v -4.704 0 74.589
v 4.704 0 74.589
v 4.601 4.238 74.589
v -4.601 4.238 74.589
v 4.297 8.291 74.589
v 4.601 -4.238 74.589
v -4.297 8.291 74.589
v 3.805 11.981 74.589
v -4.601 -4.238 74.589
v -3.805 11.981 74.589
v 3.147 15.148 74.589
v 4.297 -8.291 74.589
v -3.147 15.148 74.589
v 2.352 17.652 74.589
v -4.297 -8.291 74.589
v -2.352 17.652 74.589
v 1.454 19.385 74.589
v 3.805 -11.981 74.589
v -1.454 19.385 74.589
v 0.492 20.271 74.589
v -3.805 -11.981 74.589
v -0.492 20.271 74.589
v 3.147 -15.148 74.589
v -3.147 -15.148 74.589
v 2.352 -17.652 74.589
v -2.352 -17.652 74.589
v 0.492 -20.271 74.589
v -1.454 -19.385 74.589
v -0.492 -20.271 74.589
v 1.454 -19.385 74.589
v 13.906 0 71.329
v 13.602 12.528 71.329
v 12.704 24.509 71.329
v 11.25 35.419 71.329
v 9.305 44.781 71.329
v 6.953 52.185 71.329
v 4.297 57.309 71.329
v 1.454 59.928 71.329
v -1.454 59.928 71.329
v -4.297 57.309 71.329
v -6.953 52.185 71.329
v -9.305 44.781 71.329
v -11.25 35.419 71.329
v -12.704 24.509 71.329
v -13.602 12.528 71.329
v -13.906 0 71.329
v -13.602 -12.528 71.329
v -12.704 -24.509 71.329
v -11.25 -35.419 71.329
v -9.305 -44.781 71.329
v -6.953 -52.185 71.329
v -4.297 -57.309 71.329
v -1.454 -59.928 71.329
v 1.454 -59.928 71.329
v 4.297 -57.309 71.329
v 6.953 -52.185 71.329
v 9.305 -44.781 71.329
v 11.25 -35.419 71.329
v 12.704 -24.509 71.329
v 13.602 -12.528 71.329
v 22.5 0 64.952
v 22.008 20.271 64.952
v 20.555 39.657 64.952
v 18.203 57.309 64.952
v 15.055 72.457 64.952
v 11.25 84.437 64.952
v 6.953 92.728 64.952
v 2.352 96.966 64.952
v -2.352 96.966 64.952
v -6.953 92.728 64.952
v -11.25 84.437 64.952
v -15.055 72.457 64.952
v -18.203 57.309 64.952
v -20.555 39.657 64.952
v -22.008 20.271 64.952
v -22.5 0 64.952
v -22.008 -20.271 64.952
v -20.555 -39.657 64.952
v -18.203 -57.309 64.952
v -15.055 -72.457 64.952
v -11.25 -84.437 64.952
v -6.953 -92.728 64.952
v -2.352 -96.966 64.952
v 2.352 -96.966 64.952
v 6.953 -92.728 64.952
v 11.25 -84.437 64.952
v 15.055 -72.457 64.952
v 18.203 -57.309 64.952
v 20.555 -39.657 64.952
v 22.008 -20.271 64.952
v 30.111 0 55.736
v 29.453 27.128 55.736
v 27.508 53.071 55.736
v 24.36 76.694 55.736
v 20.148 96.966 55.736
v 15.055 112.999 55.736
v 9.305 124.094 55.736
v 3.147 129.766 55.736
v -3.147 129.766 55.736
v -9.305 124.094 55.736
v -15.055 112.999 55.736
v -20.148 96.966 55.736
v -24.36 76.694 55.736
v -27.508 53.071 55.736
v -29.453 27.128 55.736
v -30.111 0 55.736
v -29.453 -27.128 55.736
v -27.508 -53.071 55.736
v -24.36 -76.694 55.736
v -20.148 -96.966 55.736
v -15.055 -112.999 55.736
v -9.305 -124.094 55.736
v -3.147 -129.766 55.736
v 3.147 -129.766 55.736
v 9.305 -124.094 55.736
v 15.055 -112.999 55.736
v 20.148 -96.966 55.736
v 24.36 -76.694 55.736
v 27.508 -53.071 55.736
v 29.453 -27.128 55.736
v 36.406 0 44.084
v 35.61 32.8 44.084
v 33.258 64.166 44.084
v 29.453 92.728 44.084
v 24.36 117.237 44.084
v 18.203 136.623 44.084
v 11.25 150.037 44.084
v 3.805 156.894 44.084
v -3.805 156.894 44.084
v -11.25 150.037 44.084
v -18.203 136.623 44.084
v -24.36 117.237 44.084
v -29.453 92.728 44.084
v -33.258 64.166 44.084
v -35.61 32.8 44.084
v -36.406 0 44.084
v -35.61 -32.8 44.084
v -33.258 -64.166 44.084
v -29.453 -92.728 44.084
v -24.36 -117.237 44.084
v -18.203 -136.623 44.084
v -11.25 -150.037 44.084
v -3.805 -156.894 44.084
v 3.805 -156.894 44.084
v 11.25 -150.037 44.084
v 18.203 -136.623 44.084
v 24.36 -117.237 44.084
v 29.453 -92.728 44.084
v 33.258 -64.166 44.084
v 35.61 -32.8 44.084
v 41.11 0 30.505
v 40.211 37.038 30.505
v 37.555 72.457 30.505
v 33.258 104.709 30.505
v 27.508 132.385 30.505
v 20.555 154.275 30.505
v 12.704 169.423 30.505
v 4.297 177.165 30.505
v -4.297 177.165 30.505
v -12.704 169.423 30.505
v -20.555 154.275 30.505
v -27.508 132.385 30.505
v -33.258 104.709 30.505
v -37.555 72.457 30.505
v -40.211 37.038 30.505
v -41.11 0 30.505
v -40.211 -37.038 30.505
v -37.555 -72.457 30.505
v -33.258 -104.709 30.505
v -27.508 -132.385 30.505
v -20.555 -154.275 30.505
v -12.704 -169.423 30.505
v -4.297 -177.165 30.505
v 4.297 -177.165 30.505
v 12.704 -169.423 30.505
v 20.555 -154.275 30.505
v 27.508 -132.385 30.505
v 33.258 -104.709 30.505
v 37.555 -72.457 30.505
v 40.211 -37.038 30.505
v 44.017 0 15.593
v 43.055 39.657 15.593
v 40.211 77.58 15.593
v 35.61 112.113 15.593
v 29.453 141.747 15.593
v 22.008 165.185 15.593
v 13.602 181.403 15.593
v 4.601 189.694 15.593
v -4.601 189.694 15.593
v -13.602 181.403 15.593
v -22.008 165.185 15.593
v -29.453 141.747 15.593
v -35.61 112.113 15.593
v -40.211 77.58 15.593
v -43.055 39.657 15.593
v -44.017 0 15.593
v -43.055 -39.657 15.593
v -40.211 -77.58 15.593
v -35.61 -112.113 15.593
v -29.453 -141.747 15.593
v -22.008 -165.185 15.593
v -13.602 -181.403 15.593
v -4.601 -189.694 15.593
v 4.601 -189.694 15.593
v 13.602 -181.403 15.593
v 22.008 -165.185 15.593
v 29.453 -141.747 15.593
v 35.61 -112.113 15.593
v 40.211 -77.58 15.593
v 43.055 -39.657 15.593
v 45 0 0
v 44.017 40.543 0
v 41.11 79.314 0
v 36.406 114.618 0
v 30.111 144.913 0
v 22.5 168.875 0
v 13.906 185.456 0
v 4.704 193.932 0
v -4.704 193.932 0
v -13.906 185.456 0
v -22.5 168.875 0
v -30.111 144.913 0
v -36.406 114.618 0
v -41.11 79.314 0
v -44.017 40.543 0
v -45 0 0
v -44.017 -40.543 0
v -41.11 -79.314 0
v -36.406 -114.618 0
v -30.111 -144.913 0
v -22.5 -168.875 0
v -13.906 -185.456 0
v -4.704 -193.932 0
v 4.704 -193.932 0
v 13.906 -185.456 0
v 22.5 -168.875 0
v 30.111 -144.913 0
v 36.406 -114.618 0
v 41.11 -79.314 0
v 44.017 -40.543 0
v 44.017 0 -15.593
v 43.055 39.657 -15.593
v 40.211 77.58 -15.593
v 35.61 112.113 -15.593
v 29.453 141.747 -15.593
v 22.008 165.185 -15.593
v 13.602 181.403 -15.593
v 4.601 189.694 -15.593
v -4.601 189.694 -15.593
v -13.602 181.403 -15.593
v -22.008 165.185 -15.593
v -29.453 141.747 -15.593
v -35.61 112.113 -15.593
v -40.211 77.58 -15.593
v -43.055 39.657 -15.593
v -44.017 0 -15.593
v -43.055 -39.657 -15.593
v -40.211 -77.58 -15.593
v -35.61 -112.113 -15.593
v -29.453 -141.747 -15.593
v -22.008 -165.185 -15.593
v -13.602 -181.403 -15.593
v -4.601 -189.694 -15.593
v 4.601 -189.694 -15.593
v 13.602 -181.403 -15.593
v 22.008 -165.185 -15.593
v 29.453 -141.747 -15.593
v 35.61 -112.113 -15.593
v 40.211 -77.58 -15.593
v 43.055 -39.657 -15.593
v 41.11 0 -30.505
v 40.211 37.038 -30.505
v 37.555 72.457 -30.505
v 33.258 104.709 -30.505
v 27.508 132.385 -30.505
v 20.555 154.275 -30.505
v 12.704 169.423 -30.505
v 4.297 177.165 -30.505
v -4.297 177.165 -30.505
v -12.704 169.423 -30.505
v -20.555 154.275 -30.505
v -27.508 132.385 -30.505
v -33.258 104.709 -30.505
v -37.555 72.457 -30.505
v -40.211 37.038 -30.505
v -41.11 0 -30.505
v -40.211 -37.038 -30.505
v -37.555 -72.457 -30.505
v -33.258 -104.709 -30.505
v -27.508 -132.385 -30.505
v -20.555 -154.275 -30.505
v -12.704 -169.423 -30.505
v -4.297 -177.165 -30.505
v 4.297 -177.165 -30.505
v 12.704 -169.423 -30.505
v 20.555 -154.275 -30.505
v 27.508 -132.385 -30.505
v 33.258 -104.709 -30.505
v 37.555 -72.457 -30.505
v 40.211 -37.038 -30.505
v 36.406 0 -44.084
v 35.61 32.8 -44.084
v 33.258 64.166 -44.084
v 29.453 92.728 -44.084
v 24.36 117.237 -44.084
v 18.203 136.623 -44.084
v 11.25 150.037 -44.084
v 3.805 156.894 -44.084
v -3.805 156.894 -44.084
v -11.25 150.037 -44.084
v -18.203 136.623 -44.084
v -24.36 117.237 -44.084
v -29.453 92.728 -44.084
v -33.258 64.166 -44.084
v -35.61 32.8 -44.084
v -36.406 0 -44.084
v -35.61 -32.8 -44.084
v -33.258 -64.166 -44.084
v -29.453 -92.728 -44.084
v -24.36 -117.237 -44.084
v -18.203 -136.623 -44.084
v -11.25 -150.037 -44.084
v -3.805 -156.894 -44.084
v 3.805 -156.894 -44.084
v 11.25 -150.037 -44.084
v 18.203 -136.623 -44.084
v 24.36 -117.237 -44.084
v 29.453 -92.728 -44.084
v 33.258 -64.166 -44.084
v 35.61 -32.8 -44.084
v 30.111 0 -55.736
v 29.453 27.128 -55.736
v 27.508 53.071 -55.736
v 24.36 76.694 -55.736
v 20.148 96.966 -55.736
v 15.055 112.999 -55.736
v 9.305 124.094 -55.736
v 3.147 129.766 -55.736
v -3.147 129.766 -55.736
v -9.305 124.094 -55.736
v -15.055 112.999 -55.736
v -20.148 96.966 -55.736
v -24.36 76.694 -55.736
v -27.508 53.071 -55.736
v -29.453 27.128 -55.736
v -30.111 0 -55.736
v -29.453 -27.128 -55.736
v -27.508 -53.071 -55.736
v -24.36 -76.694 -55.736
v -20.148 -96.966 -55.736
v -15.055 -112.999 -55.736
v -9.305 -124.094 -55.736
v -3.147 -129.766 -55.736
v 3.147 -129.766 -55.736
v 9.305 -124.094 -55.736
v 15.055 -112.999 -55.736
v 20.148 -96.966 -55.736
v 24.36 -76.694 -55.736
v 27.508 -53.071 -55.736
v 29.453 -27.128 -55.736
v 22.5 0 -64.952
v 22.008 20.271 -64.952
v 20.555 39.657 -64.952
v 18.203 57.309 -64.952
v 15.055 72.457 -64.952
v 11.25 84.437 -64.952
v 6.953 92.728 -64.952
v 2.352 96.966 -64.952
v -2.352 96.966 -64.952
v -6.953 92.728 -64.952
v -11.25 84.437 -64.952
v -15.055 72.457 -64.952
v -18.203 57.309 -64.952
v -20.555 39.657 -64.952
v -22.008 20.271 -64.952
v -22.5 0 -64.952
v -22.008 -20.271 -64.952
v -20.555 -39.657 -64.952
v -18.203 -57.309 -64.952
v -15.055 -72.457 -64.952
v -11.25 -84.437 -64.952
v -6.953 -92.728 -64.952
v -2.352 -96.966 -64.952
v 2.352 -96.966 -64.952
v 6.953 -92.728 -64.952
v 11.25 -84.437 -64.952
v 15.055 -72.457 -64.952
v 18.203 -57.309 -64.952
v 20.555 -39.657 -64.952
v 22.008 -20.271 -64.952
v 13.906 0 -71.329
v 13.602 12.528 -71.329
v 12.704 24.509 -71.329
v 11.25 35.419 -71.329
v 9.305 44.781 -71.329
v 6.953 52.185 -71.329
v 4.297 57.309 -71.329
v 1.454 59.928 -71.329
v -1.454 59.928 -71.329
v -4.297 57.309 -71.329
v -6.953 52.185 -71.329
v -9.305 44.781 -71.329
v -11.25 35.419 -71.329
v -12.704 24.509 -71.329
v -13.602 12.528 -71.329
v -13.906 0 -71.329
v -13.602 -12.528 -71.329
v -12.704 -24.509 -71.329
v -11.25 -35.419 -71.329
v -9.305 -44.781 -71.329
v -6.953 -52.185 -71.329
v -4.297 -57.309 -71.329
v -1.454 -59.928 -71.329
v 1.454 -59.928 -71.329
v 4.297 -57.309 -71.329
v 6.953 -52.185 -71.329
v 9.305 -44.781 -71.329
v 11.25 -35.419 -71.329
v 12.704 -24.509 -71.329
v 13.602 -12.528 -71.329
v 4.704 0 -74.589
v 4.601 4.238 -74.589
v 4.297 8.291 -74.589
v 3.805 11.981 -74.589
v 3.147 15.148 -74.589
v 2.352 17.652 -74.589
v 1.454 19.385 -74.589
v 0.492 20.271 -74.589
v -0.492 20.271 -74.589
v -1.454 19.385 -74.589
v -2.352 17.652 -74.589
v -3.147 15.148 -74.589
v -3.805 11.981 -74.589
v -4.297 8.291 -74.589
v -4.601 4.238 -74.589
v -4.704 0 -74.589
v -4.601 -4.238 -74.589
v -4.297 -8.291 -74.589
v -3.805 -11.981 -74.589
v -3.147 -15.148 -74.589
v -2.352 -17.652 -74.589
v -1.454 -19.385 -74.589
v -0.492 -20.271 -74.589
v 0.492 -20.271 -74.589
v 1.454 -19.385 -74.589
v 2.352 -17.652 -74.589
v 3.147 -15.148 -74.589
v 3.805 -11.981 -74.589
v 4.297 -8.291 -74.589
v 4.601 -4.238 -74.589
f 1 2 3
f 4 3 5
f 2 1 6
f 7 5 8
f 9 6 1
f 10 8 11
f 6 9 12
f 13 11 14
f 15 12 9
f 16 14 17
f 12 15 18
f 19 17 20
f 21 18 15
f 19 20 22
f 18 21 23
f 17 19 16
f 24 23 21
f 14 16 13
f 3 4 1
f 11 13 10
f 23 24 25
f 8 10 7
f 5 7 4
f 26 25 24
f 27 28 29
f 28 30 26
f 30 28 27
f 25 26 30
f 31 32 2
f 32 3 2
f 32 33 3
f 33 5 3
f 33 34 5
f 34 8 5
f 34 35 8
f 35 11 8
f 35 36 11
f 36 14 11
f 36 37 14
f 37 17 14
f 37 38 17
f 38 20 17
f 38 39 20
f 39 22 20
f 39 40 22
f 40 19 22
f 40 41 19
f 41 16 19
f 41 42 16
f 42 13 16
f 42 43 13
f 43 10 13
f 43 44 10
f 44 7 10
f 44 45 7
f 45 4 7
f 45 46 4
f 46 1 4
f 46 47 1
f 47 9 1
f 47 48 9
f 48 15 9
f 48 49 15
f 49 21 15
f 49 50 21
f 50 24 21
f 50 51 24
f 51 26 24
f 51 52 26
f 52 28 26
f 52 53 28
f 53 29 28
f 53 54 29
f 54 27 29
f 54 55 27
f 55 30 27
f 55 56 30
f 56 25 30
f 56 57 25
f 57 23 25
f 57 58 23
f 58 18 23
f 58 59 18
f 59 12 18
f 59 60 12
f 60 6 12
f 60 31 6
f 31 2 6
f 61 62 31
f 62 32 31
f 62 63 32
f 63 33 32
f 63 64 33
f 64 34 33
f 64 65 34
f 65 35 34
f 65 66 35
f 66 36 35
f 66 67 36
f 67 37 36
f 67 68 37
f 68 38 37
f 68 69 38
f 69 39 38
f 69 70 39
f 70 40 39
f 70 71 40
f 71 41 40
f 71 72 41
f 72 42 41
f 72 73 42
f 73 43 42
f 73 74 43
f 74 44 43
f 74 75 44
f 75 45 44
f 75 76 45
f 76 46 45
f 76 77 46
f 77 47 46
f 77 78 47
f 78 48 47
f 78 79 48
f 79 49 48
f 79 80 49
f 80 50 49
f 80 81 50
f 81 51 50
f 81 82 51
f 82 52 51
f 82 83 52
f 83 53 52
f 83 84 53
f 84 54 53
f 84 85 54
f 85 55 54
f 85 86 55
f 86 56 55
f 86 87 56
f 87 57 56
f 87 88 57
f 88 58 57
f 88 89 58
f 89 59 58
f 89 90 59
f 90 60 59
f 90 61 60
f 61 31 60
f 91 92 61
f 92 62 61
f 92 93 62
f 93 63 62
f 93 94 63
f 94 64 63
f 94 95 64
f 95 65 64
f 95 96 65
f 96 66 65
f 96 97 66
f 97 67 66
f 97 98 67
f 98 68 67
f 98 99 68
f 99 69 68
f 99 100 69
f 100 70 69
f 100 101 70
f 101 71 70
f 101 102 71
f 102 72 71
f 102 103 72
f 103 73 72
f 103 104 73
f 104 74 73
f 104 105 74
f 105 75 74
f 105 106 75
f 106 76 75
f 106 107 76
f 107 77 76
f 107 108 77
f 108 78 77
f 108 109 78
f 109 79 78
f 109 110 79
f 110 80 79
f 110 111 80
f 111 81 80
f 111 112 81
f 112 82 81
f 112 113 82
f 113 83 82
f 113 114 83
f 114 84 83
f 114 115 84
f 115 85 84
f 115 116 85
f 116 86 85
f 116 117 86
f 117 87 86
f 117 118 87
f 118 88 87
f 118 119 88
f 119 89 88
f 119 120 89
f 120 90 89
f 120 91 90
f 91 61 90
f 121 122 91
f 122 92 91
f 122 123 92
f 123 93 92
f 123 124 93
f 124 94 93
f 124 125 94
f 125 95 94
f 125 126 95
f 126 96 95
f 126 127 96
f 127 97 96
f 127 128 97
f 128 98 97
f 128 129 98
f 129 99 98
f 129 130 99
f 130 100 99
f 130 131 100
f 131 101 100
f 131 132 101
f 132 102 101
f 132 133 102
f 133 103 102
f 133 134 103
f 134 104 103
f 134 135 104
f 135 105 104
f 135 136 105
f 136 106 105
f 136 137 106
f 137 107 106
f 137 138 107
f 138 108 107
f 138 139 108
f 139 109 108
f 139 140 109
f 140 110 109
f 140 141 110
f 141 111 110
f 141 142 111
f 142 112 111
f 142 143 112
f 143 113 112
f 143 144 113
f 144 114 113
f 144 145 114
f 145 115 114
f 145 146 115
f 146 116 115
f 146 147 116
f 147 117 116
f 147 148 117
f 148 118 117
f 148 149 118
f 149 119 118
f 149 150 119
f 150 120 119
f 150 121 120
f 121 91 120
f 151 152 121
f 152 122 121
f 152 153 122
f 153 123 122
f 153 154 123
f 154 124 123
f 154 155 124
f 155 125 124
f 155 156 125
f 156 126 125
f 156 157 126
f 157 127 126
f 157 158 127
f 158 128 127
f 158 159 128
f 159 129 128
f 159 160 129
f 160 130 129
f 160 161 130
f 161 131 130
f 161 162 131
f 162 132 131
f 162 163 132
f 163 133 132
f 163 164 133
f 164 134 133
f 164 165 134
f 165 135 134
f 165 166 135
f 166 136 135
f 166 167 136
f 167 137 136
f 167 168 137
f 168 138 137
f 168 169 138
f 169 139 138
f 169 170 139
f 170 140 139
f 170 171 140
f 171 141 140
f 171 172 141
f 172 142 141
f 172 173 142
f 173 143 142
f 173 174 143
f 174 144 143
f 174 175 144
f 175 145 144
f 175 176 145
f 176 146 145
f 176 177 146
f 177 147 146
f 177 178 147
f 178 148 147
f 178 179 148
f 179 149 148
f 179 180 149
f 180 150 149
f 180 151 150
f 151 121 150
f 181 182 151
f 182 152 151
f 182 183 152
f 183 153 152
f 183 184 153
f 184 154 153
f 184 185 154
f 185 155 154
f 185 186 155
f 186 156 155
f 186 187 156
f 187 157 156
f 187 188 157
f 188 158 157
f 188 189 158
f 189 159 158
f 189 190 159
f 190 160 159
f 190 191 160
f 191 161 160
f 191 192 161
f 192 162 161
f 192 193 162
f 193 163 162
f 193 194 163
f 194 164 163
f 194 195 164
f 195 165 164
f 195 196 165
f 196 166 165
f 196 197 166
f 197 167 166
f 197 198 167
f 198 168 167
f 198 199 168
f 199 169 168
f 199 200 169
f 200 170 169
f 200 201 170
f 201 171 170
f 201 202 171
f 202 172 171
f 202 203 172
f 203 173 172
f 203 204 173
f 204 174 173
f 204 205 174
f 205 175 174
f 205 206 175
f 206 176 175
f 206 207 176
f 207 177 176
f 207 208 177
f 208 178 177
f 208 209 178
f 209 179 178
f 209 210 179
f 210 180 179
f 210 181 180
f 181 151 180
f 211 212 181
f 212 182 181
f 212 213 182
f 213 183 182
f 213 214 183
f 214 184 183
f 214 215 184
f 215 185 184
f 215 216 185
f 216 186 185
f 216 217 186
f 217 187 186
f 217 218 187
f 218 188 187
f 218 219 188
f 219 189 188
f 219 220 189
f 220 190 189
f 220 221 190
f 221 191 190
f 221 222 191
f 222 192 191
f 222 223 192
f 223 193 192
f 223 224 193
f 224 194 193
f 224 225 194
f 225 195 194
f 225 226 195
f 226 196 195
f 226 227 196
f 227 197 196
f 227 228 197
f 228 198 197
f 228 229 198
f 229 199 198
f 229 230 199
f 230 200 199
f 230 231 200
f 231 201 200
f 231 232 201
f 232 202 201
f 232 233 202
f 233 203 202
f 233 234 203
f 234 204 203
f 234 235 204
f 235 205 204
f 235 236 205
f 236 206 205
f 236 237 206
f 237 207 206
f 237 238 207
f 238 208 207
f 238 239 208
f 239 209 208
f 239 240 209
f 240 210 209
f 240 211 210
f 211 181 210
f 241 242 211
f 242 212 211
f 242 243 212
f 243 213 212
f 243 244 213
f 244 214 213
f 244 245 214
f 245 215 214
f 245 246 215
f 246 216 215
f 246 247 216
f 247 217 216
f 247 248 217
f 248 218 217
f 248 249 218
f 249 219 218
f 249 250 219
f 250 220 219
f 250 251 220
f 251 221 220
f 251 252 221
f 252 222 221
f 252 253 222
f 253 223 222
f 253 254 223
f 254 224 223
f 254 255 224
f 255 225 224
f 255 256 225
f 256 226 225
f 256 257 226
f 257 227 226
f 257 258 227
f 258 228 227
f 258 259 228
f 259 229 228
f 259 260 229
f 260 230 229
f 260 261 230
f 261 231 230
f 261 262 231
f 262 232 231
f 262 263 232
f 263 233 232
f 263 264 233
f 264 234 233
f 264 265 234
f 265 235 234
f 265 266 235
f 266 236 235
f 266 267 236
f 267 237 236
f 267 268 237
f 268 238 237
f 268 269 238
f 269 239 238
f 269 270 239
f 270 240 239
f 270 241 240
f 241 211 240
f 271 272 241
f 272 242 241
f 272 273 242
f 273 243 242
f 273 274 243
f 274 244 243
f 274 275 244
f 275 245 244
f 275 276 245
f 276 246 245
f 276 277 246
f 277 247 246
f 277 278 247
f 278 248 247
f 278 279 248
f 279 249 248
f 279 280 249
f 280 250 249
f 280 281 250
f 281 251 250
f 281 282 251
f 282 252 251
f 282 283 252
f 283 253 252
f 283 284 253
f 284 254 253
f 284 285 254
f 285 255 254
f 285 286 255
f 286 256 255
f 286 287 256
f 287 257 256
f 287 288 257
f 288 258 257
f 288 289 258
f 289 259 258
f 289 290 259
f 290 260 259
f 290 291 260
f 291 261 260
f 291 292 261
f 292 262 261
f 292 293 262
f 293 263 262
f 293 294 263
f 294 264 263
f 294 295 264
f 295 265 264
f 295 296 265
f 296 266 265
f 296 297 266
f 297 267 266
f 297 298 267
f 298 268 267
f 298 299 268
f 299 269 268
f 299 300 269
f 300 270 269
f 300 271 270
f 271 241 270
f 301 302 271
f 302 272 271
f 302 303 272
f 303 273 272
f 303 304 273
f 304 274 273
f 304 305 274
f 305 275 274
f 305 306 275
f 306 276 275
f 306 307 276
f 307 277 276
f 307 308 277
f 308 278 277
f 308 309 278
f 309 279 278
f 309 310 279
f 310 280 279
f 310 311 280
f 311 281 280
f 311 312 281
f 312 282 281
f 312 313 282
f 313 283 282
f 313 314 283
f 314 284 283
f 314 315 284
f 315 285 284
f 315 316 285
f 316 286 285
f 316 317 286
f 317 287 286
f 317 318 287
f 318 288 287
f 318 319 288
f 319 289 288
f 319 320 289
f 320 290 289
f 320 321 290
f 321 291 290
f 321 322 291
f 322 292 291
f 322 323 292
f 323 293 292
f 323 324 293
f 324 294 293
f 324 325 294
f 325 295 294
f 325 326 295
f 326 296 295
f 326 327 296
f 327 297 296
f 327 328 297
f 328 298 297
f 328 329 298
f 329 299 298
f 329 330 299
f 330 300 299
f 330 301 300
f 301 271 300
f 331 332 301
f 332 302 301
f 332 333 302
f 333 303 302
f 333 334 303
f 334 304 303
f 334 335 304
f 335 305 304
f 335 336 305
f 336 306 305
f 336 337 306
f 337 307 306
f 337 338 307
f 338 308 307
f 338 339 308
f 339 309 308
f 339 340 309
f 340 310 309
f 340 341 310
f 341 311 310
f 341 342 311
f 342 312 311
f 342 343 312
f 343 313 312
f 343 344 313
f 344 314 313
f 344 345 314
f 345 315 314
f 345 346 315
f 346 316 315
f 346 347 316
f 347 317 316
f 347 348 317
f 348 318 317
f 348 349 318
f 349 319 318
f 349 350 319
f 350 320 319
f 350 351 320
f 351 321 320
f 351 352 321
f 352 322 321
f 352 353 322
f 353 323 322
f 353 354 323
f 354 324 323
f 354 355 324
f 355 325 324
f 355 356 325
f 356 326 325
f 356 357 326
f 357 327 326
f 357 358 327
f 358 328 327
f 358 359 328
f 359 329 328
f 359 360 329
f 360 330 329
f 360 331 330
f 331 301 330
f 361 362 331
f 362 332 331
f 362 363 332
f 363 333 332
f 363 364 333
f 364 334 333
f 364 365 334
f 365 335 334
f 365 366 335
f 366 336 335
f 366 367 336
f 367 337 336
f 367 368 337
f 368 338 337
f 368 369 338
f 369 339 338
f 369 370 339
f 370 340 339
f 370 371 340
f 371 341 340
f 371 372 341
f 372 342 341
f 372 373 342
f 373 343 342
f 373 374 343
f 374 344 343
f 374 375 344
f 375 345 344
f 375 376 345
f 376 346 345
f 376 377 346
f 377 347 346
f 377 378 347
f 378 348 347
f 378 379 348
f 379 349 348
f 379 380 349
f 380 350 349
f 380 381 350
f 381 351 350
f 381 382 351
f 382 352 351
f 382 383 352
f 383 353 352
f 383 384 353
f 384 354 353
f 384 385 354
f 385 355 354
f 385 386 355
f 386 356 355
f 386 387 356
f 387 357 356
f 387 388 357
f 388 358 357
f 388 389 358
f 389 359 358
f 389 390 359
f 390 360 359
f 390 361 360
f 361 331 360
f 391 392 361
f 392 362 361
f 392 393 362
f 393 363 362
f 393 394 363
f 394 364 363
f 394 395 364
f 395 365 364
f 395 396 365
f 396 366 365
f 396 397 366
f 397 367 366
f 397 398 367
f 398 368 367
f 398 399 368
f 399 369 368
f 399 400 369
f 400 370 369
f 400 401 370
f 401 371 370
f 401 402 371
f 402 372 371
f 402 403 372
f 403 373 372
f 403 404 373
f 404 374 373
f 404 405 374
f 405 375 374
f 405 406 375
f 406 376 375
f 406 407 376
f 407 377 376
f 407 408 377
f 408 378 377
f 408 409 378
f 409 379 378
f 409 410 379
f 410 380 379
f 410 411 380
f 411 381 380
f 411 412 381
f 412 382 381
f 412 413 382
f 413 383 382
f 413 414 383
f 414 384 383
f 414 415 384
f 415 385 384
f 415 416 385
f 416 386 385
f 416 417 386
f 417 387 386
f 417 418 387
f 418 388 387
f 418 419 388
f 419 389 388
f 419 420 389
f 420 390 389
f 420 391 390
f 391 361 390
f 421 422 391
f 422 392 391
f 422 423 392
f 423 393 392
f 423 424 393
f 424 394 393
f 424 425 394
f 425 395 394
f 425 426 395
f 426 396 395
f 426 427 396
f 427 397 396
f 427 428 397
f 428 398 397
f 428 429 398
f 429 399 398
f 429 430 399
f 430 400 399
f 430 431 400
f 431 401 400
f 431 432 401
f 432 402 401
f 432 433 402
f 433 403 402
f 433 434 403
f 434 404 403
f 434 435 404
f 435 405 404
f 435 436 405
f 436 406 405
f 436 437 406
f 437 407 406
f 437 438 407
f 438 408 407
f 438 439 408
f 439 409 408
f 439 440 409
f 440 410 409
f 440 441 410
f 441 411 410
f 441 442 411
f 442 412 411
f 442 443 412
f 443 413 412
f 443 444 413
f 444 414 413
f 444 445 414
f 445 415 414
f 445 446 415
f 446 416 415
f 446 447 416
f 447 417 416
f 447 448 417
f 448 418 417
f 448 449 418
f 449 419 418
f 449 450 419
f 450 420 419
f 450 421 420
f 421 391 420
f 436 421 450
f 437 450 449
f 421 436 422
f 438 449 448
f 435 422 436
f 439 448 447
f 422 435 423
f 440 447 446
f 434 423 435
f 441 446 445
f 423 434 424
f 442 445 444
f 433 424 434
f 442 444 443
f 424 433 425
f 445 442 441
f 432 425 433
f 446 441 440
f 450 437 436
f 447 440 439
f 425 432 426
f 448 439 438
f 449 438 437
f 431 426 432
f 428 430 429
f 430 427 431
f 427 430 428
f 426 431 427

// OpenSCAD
// Generated by SolidPython 1.0.1 on 2020-07-29 00:46:45


scale(v = [3, 13, 5]) {
	sphere(r = 15);
}
/***********************************************
*********      SolidPython code:      **********
************************************************
 
# import packages: SolidPython
from solid import *
from solid.utils import *
from itertools import chain, combinations, permutations


class Resize:

    def __init__(self, scad_file):
        self.scad_file = scad_file
        #self.scad_file = import_scad(scad_file)
        # cone/cylinder param:
        self.r1 = 0
        self.r2 = 0
        self.h = 0
        # rectangular prism param:
        self.w = 0
        self.l = 0
        # ellipse param:
        self.r = 0

    # import OpenScad code (file name corresponds to shape)


    # classify shape + parameters
    def assign(self, param1, param2, param3):
        if self.scad_file == 'cone.scad':
            self.r1 = param1
            self.r2 = param2
            self.h = param3
        elif self.scad_file == 'cylinder.scad':
            self.r1 = param1
            self.r2 = param2
            self.h = param3
        elif self.scad_file == 'rectangularPrism.scad':
            self.h = param1
            self.l = param2
            self.w = param3
        else:
            self.r = param1
            self.h = param2

    # resize parameters
    def iterate(self):
        x = range(3, 20, 2)
        i = 1
        if self.scad_file == 'cone.scad':
            tempList = list(permutations(x, 2))
            for temp in tempList:
                param1 = temp[0]
                param2 = temp[1]
                filepath = 'produced_scad_files/' + 'cone' + str(param1) + '_' + str(param2) + '_' + '.scad'
                scad_render_to_file(cylinder(h=param1, r1=param2, r2=0), filepath)

        elif self.scad_file == 'cylinder.scad':
            tempList = list(permutations(x, 3))
            for temp in tempList:
                param1 = temp[0]
                param2 = temp[1]
                filepath = 'produced_scad_files/' + 'cylinder' + str(param1) + '_' + str(param2) + '_' + '.scad'
                scad_render_to_file(cylinder(h=param1, r1=param2, r2=param2), filepath)

        elif self.scad_file == 'rectangularPrism.scad':
            tempList = list(permutations(x, 3))
            for temp in tempList:
                param1 = temp[0]
                param2 = temp[1]
                param3 = temp[2]
                filepath = 'produced_scad_files/' + 'rectangularPrism' + str(param1) + '_' + str(param2) + '_' + str(
                    param3) + '.scad'
                scad_render_to_file(cube(size=(param1, param2, param3)), filepath)

        elif self.scad_file == 'ellipse.scad':
            tempList = list(permutations(x, 4))
            for temp in tempList:
                param1 = temp[0]
                param2 = temp[1]
                param3 = temp[2]
                param4 = temp[3]
                filepath = 'produced_scad_files/' + 'ellipse' + str(param1) + '_' + str(param2) + '_' + str(param3) + '_' + str(param4) + '.scad'
                scad_render_to_file(scale([param1, param2, param3])(sphere(r=param4)), filepath)

    def render_to_scadfile(self):
        scad_render_to_file(scad, 'example.scad') 
 
************************************************/
